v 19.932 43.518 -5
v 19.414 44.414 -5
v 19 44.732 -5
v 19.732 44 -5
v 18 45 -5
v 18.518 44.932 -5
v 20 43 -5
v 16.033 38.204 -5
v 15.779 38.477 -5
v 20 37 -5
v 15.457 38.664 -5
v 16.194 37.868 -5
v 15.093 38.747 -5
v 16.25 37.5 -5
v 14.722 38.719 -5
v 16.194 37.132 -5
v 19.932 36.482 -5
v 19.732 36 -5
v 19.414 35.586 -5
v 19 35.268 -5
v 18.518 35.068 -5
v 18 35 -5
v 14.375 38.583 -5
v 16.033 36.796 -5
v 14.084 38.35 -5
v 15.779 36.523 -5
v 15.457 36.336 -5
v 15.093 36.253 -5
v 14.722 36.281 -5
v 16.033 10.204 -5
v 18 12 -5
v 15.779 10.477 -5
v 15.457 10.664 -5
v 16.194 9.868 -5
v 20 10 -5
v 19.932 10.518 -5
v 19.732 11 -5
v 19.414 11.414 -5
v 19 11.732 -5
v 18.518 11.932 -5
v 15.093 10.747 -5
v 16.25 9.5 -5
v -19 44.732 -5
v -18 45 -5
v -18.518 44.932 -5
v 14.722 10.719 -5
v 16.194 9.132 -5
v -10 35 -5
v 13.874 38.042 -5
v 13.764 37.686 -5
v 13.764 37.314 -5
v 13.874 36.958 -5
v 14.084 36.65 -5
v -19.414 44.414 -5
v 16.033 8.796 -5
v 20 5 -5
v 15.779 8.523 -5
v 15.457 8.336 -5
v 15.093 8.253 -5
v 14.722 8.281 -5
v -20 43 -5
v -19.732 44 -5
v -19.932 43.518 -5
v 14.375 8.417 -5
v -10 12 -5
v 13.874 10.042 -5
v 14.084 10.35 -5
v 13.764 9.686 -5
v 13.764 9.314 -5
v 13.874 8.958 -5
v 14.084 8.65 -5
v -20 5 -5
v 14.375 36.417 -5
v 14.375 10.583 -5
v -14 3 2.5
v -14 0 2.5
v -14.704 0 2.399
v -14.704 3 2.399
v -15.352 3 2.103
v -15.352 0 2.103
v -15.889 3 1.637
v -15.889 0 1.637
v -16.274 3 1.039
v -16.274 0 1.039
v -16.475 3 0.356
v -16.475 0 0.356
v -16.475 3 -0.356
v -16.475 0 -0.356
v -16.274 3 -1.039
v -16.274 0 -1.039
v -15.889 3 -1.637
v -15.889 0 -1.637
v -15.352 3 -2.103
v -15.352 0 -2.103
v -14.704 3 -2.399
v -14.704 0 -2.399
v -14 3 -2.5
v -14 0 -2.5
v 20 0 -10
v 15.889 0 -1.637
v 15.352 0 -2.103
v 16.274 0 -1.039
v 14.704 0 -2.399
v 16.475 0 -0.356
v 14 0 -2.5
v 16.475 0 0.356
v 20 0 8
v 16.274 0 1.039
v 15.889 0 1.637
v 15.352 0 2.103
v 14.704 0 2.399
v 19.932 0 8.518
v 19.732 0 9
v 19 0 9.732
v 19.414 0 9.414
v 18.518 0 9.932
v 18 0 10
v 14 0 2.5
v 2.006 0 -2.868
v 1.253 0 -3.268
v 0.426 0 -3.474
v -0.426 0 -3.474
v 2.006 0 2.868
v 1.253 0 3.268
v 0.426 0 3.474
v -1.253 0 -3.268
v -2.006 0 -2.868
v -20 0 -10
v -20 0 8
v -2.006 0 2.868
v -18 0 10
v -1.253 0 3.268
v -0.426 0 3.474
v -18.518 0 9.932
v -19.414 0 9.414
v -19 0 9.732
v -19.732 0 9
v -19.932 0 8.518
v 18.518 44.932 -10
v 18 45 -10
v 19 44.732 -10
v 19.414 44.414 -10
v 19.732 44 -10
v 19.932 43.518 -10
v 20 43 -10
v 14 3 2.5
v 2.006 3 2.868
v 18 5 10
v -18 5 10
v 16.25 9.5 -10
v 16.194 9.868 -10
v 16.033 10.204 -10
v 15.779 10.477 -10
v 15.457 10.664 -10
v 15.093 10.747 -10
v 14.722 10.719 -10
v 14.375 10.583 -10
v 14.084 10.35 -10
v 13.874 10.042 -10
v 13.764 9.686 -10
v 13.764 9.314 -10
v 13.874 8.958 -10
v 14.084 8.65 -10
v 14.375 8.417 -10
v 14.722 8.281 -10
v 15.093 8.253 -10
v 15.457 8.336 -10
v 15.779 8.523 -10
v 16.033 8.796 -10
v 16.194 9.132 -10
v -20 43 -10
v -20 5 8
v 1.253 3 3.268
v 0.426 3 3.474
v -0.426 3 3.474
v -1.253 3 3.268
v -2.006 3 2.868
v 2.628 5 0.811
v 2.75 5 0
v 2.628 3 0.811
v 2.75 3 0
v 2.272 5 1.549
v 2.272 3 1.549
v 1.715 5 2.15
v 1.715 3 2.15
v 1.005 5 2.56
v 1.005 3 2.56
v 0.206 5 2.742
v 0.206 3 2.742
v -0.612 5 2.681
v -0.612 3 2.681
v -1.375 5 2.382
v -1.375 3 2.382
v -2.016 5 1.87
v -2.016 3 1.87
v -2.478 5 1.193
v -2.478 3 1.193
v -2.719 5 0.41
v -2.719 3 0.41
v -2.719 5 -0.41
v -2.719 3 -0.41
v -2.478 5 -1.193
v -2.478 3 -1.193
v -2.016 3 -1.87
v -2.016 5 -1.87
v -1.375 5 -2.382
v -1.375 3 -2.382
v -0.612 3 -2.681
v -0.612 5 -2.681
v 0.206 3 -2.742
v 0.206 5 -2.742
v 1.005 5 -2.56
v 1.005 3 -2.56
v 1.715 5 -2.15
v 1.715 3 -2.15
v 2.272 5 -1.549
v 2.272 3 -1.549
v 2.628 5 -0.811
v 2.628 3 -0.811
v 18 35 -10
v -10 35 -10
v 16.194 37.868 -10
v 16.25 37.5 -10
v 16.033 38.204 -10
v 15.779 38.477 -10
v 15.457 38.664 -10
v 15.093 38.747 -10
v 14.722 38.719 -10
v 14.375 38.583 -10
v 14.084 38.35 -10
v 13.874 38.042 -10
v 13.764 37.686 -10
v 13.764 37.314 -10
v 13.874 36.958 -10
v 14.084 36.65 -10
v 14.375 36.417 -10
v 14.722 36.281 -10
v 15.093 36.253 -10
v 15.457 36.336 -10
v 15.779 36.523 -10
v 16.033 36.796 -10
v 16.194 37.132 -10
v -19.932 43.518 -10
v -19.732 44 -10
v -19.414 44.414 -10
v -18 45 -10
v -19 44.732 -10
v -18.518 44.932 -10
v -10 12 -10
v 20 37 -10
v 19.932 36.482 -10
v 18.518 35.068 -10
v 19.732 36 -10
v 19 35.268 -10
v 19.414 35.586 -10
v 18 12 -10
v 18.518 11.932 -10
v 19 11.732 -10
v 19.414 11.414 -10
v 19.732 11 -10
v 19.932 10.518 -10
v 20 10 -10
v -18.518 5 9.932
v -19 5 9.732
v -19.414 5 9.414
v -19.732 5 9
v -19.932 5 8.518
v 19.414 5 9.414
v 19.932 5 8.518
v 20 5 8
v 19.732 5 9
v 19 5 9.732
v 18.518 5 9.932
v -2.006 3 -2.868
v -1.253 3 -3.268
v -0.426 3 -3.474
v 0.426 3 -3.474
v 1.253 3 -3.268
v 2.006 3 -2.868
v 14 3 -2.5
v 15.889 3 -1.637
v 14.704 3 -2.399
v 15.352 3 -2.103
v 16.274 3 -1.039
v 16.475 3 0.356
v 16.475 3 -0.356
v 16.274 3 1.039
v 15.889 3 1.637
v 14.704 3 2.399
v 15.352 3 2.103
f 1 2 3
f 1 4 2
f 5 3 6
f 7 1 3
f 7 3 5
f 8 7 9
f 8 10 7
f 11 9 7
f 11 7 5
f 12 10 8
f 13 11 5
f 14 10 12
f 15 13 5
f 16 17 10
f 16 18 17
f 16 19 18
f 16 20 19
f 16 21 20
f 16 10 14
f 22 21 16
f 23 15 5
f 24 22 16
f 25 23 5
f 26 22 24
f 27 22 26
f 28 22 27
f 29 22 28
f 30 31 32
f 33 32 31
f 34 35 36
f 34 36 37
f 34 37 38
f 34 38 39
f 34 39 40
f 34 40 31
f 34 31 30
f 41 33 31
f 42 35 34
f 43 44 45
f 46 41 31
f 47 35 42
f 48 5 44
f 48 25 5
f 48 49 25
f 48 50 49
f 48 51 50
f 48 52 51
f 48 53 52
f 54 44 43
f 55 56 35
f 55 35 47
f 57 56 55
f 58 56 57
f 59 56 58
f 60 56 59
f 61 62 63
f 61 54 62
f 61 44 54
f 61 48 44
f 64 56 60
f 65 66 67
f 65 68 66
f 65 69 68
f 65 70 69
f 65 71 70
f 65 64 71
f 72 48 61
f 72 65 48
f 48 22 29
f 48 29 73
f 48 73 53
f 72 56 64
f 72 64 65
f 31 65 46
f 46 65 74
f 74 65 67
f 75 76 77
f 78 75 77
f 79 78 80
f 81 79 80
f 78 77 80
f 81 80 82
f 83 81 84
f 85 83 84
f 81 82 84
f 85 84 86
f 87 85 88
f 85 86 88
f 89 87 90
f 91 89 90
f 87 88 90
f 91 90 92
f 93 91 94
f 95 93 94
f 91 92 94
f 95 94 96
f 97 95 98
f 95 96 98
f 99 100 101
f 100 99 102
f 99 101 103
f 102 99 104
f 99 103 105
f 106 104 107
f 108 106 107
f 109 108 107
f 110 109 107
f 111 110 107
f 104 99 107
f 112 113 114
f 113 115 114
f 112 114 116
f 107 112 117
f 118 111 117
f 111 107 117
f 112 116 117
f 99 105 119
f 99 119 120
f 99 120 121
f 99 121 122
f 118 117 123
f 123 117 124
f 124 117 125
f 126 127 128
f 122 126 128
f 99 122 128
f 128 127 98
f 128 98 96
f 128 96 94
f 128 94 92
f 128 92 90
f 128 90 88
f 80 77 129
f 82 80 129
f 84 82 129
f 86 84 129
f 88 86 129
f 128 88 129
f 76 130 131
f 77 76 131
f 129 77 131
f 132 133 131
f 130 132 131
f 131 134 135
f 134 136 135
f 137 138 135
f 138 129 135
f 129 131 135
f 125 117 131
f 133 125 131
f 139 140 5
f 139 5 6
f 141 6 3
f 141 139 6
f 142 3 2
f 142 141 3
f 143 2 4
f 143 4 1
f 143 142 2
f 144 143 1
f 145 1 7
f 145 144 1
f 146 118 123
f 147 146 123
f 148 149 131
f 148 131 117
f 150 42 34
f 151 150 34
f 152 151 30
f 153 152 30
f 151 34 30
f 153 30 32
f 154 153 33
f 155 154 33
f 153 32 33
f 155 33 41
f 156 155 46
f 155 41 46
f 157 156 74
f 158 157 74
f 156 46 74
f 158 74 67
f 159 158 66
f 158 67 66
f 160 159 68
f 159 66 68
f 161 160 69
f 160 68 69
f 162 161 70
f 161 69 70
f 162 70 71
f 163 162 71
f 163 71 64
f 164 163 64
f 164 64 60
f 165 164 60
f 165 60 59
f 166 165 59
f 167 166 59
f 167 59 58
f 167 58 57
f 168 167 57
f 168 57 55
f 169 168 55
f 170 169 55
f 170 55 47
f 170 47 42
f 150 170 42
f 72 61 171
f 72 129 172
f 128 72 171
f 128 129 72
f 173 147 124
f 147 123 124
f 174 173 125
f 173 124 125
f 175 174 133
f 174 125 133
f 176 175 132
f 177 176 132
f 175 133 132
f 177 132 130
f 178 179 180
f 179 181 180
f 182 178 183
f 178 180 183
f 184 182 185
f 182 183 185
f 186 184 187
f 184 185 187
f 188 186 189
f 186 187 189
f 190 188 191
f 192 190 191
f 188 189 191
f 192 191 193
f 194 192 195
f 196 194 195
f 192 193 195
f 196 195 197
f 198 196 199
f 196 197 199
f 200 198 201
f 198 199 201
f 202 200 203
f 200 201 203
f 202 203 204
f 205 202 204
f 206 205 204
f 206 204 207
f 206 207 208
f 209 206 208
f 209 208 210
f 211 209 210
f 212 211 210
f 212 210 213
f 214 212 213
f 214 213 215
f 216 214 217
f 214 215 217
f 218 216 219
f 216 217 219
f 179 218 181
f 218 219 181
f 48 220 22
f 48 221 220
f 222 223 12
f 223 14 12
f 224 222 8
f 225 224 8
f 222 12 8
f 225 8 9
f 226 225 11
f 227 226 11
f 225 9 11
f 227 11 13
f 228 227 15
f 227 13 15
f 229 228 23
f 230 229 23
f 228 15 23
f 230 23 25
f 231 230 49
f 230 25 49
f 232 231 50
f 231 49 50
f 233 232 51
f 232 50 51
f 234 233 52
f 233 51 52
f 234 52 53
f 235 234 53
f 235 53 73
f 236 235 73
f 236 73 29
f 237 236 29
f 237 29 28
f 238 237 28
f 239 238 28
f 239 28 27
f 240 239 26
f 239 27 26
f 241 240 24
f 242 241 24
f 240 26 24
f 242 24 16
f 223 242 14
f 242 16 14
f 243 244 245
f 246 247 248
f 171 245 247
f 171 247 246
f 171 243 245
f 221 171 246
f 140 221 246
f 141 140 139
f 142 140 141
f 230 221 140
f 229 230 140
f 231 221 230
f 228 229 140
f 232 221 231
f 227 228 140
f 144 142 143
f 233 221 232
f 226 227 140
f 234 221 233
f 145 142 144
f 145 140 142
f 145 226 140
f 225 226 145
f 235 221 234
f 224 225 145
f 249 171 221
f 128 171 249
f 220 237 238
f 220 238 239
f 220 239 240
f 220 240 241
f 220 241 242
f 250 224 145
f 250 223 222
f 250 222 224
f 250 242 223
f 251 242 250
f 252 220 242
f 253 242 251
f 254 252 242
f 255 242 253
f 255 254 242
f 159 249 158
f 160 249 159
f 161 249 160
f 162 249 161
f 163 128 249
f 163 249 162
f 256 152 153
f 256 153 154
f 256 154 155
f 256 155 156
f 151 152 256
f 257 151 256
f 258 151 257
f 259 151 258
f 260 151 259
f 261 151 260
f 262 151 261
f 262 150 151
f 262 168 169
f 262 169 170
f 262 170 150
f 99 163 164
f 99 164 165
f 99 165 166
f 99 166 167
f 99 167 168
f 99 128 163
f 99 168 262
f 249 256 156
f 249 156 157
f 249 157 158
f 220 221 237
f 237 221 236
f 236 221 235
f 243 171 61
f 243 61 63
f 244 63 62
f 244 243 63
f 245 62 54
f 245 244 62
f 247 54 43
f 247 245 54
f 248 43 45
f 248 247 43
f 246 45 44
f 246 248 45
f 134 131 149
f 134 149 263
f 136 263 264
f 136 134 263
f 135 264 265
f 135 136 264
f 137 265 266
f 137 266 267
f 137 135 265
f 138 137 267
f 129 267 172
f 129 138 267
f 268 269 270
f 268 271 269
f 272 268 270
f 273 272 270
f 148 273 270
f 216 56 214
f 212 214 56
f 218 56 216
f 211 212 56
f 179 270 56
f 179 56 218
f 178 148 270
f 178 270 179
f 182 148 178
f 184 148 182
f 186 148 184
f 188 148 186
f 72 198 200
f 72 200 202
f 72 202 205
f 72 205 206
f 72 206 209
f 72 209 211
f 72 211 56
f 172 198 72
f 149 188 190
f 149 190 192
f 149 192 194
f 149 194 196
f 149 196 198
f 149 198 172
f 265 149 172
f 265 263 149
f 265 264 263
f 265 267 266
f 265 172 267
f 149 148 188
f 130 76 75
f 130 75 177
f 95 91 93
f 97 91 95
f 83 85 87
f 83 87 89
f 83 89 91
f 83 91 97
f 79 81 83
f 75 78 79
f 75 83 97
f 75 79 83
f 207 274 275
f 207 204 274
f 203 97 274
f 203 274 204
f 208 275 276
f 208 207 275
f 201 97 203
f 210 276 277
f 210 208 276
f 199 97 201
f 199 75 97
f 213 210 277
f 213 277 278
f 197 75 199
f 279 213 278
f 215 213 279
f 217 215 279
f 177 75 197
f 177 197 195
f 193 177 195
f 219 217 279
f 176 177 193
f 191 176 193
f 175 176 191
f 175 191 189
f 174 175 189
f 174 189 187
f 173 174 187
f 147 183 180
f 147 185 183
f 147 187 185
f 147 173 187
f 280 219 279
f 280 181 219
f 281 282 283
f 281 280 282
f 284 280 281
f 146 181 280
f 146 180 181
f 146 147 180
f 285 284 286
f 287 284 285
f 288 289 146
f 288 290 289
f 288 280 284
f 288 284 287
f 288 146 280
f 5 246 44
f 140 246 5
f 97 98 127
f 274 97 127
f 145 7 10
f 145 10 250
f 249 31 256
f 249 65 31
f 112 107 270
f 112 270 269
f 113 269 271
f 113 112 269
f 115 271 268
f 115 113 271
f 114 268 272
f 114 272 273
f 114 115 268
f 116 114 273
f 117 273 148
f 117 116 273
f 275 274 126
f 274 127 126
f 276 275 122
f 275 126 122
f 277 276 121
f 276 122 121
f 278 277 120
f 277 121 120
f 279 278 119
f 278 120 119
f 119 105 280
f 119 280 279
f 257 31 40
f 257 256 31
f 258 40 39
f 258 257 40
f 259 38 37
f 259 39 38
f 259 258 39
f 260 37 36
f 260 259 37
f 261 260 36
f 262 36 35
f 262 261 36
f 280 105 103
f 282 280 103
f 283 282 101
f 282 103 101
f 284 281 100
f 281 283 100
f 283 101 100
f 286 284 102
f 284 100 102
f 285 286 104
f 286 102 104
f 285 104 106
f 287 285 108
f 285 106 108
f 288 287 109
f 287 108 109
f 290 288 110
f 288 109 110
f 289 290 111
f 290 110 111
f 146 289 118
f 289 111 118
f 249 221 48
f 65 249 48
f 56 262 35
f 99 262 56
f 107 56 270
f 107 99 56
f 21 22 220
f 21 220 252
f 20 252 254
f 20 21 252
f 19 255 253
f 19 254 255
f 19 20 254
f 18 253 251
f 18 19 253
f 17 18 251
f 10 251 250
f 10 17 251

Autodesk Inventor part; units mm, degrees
ref_plane "YZ Plane" through (0, 0, 0) normal (1, 0, 0) x (0, 1, 0)
ref_plane "XZ Plane" through (0, 0, 0) normal (0, 1, 0) x (-1, 0, 0)
ref_plane "XY Plane" through (0, 0, 0) normal (0, 0, 1) x (1, 0, 0)
sketch "Sketch1" plane through (0, 0, 0) normal (0, 1, 0) x (-1, 0, 0)
  line L0 (-20, 20) -> (20, 20)
  line L1 (20, 20) -> (20, -20)
  line L2 (20, -20) -> (-20, -20)
  line L3 (-20, -20) -> (-20, 20)
  line L4 (-20, 20) -> (20, -20) construction
  line L5 (20, 20) -> (-20, -20) construction
  point P0 (0, 0)
  dimension "d0" = 40
  dimension "d1" = 40
extrude "Extrusion1" add sketch "Sketch1" along normal blind 5
sketch "Sketch4" plane through (0, 5, 0) normal (0, 1, 0) x (1, 0, 0)
  line L0 (-20, 10) -> (-10, 10)
  line L1 (-10, 10) -> (-10, 5)
  line L2 (-10, 5) -> (-20, 5)
  line L3 (-20, 5) -> (-20, 10)
  line L4 (-20, 10) -> (-10, 5) construction
  line L5 (-10, 10) -> (-20, 5) construction
  line L6 (-20, -20) -> (20, -20) projected
  line L7 (20, -20) -> (20, 20) projected
  line L8 (-20, 20) -> (-20, -20) projected
  point P0 (-15, 7.5)
  dimension "d20" = 10
  dimension "d21" = 5
  dimension "d23" = 25
extrude "Extrusion4" add sketch "Sketch4" along normal blind 40
sketch "Sketch8" plane through (-10, 5, -5) normal (1, 0, 0) x (0, 0, -1)
  line L0 (0, 40) -> (5, 40)
  line L1 (5, 40) -> (5, 30)
  line L2 (5, 30) -> (0, 30)
  line L3 (0, 30) -> (0, 40)
  line L4 (0, 7) -> (5, 7)
  line L5 (5, 7) -> (5, 0)
  line L6 (5, 0) -> (0, 0)
  line L7 (0, 0) -> (0, 7)
  line L8 (5, 0) -> (5, 40) projected
  line L9 (0, 40) -> (5, 40) projected
  point P0 (-5, -5)
  dimension "d44" = 5
  dimension "d45" = 10
  dimension "d46" = 5
  dimension "d47" = 7
  dimension "d48" = 23
extrude "Extrusion7" add sketch "Sketch8" along normal blind 30
sketch "Sketch9" plane through (-20, 5, -5) normal (0, 0, 1) x (1, 0, 0)
  circle A0 centre (35, 32.5) radius 1.25
  circle A1 centre (35, 4.5) radius 1.25
  line L0 (10, 30) -> (40, 30) projected
  line L1 (40, 40) -> (40, 30) projected
  line L2 (40, 7) -> (40, 0) projected
  point P0 (20, -5)
  dimension "d51" = 2.5
  dimension "d52" = 2.5
  dimension "d53" = 28
  dimension "d54" = 2.5
  dimension "d55" = 5
  dimension "d56" = 5
extrude "Extrusion8" cut sketch "Sketch9" against normal blind 5
sketch "Sketch11" plane through (0, 5, 0) normal (0, 1, 0) x (1, 0, 0)
  line L0 (20, -20) -> (-20, -20)
  line L1 (-20, -20) -> (-20, -10)
  line L2 (-20, -10) -> (20, -10)
  line L3 (20, -10) -> (20, -20)
  line L4 (-20, 10) -> (20, 10)
  line L5 (20, 10) -> (20, 20)
  line L6 (20, 20) -> (-20, 20)
  line L7 (-20, 20) -> (-20, 10)
  line L8 (20, 20) -> (-20, 20) projected
  line L9 (-20, -20) -> (20, -20) projected
  line L10 (20, -20) -> (20, 5) projected
  line L11 (20, 10) -> (20, 20) projected
  point P0 (0, 0)
  dimension "d59" = 40
  dimension "d60" = 10
  dimension "d61" = 40
  dimension "d62" = 10
extrude "Extrusion9" cut sketch "Sketch11" against normal blind 5
sketch "Sketch12" plane through (0, 0, 0) normal (0, -1, 0) x (1, 0, 0)
  circle A0 centre (0, 0) radius 3.5
  circle A1 centre (14, 0) radius 2.5
  circle A2 centre (-14, 0) radius 2.5
  line L0 (-20, -10) -> (20, -10) projected
  line L1 (-14, 2.5) -> (-2.0057, 2.8683)
  line L2 (-14, -2.5) -> (-2.0057, -2.8683)
  line L3 (14, 2.5) -> (2.0057, 2.8683)
  line L4 (14, -2.5) -> (2.0057, -2.8683)
  dimension "d65" = 7
  dimension "d66" = 5
  dimension "d67" = 5
  dimension "d68" = 14
  dimension "d69" = 10
  dimension "d70" = 10
  dimension "d71" = 14
  dimension "d72" = 12
  dimension "d73" = 12
extrude "Extrusion10" cut sketch "Sketch12" against normal blind 3
sketch "Sketch13" plane through (0, 3, 0) normal (0, -1, 0) x (1, 0, 0)
  circle A0 centre (0, 0) radius 2.75
  dimension "d76" = 5.5
extrude "Extrusion11" cut sketch "Sketch13" against normal blind 3
fillet "Fillet1" radius 2 6 edges at (20, 45, -7.5) (20, 35, -7.5) (20, 12, -7.5) (20, 2.5, 10) (-20, 2.5, 10) (-20, 45, -7.5)
properties part number "head_bottom"
